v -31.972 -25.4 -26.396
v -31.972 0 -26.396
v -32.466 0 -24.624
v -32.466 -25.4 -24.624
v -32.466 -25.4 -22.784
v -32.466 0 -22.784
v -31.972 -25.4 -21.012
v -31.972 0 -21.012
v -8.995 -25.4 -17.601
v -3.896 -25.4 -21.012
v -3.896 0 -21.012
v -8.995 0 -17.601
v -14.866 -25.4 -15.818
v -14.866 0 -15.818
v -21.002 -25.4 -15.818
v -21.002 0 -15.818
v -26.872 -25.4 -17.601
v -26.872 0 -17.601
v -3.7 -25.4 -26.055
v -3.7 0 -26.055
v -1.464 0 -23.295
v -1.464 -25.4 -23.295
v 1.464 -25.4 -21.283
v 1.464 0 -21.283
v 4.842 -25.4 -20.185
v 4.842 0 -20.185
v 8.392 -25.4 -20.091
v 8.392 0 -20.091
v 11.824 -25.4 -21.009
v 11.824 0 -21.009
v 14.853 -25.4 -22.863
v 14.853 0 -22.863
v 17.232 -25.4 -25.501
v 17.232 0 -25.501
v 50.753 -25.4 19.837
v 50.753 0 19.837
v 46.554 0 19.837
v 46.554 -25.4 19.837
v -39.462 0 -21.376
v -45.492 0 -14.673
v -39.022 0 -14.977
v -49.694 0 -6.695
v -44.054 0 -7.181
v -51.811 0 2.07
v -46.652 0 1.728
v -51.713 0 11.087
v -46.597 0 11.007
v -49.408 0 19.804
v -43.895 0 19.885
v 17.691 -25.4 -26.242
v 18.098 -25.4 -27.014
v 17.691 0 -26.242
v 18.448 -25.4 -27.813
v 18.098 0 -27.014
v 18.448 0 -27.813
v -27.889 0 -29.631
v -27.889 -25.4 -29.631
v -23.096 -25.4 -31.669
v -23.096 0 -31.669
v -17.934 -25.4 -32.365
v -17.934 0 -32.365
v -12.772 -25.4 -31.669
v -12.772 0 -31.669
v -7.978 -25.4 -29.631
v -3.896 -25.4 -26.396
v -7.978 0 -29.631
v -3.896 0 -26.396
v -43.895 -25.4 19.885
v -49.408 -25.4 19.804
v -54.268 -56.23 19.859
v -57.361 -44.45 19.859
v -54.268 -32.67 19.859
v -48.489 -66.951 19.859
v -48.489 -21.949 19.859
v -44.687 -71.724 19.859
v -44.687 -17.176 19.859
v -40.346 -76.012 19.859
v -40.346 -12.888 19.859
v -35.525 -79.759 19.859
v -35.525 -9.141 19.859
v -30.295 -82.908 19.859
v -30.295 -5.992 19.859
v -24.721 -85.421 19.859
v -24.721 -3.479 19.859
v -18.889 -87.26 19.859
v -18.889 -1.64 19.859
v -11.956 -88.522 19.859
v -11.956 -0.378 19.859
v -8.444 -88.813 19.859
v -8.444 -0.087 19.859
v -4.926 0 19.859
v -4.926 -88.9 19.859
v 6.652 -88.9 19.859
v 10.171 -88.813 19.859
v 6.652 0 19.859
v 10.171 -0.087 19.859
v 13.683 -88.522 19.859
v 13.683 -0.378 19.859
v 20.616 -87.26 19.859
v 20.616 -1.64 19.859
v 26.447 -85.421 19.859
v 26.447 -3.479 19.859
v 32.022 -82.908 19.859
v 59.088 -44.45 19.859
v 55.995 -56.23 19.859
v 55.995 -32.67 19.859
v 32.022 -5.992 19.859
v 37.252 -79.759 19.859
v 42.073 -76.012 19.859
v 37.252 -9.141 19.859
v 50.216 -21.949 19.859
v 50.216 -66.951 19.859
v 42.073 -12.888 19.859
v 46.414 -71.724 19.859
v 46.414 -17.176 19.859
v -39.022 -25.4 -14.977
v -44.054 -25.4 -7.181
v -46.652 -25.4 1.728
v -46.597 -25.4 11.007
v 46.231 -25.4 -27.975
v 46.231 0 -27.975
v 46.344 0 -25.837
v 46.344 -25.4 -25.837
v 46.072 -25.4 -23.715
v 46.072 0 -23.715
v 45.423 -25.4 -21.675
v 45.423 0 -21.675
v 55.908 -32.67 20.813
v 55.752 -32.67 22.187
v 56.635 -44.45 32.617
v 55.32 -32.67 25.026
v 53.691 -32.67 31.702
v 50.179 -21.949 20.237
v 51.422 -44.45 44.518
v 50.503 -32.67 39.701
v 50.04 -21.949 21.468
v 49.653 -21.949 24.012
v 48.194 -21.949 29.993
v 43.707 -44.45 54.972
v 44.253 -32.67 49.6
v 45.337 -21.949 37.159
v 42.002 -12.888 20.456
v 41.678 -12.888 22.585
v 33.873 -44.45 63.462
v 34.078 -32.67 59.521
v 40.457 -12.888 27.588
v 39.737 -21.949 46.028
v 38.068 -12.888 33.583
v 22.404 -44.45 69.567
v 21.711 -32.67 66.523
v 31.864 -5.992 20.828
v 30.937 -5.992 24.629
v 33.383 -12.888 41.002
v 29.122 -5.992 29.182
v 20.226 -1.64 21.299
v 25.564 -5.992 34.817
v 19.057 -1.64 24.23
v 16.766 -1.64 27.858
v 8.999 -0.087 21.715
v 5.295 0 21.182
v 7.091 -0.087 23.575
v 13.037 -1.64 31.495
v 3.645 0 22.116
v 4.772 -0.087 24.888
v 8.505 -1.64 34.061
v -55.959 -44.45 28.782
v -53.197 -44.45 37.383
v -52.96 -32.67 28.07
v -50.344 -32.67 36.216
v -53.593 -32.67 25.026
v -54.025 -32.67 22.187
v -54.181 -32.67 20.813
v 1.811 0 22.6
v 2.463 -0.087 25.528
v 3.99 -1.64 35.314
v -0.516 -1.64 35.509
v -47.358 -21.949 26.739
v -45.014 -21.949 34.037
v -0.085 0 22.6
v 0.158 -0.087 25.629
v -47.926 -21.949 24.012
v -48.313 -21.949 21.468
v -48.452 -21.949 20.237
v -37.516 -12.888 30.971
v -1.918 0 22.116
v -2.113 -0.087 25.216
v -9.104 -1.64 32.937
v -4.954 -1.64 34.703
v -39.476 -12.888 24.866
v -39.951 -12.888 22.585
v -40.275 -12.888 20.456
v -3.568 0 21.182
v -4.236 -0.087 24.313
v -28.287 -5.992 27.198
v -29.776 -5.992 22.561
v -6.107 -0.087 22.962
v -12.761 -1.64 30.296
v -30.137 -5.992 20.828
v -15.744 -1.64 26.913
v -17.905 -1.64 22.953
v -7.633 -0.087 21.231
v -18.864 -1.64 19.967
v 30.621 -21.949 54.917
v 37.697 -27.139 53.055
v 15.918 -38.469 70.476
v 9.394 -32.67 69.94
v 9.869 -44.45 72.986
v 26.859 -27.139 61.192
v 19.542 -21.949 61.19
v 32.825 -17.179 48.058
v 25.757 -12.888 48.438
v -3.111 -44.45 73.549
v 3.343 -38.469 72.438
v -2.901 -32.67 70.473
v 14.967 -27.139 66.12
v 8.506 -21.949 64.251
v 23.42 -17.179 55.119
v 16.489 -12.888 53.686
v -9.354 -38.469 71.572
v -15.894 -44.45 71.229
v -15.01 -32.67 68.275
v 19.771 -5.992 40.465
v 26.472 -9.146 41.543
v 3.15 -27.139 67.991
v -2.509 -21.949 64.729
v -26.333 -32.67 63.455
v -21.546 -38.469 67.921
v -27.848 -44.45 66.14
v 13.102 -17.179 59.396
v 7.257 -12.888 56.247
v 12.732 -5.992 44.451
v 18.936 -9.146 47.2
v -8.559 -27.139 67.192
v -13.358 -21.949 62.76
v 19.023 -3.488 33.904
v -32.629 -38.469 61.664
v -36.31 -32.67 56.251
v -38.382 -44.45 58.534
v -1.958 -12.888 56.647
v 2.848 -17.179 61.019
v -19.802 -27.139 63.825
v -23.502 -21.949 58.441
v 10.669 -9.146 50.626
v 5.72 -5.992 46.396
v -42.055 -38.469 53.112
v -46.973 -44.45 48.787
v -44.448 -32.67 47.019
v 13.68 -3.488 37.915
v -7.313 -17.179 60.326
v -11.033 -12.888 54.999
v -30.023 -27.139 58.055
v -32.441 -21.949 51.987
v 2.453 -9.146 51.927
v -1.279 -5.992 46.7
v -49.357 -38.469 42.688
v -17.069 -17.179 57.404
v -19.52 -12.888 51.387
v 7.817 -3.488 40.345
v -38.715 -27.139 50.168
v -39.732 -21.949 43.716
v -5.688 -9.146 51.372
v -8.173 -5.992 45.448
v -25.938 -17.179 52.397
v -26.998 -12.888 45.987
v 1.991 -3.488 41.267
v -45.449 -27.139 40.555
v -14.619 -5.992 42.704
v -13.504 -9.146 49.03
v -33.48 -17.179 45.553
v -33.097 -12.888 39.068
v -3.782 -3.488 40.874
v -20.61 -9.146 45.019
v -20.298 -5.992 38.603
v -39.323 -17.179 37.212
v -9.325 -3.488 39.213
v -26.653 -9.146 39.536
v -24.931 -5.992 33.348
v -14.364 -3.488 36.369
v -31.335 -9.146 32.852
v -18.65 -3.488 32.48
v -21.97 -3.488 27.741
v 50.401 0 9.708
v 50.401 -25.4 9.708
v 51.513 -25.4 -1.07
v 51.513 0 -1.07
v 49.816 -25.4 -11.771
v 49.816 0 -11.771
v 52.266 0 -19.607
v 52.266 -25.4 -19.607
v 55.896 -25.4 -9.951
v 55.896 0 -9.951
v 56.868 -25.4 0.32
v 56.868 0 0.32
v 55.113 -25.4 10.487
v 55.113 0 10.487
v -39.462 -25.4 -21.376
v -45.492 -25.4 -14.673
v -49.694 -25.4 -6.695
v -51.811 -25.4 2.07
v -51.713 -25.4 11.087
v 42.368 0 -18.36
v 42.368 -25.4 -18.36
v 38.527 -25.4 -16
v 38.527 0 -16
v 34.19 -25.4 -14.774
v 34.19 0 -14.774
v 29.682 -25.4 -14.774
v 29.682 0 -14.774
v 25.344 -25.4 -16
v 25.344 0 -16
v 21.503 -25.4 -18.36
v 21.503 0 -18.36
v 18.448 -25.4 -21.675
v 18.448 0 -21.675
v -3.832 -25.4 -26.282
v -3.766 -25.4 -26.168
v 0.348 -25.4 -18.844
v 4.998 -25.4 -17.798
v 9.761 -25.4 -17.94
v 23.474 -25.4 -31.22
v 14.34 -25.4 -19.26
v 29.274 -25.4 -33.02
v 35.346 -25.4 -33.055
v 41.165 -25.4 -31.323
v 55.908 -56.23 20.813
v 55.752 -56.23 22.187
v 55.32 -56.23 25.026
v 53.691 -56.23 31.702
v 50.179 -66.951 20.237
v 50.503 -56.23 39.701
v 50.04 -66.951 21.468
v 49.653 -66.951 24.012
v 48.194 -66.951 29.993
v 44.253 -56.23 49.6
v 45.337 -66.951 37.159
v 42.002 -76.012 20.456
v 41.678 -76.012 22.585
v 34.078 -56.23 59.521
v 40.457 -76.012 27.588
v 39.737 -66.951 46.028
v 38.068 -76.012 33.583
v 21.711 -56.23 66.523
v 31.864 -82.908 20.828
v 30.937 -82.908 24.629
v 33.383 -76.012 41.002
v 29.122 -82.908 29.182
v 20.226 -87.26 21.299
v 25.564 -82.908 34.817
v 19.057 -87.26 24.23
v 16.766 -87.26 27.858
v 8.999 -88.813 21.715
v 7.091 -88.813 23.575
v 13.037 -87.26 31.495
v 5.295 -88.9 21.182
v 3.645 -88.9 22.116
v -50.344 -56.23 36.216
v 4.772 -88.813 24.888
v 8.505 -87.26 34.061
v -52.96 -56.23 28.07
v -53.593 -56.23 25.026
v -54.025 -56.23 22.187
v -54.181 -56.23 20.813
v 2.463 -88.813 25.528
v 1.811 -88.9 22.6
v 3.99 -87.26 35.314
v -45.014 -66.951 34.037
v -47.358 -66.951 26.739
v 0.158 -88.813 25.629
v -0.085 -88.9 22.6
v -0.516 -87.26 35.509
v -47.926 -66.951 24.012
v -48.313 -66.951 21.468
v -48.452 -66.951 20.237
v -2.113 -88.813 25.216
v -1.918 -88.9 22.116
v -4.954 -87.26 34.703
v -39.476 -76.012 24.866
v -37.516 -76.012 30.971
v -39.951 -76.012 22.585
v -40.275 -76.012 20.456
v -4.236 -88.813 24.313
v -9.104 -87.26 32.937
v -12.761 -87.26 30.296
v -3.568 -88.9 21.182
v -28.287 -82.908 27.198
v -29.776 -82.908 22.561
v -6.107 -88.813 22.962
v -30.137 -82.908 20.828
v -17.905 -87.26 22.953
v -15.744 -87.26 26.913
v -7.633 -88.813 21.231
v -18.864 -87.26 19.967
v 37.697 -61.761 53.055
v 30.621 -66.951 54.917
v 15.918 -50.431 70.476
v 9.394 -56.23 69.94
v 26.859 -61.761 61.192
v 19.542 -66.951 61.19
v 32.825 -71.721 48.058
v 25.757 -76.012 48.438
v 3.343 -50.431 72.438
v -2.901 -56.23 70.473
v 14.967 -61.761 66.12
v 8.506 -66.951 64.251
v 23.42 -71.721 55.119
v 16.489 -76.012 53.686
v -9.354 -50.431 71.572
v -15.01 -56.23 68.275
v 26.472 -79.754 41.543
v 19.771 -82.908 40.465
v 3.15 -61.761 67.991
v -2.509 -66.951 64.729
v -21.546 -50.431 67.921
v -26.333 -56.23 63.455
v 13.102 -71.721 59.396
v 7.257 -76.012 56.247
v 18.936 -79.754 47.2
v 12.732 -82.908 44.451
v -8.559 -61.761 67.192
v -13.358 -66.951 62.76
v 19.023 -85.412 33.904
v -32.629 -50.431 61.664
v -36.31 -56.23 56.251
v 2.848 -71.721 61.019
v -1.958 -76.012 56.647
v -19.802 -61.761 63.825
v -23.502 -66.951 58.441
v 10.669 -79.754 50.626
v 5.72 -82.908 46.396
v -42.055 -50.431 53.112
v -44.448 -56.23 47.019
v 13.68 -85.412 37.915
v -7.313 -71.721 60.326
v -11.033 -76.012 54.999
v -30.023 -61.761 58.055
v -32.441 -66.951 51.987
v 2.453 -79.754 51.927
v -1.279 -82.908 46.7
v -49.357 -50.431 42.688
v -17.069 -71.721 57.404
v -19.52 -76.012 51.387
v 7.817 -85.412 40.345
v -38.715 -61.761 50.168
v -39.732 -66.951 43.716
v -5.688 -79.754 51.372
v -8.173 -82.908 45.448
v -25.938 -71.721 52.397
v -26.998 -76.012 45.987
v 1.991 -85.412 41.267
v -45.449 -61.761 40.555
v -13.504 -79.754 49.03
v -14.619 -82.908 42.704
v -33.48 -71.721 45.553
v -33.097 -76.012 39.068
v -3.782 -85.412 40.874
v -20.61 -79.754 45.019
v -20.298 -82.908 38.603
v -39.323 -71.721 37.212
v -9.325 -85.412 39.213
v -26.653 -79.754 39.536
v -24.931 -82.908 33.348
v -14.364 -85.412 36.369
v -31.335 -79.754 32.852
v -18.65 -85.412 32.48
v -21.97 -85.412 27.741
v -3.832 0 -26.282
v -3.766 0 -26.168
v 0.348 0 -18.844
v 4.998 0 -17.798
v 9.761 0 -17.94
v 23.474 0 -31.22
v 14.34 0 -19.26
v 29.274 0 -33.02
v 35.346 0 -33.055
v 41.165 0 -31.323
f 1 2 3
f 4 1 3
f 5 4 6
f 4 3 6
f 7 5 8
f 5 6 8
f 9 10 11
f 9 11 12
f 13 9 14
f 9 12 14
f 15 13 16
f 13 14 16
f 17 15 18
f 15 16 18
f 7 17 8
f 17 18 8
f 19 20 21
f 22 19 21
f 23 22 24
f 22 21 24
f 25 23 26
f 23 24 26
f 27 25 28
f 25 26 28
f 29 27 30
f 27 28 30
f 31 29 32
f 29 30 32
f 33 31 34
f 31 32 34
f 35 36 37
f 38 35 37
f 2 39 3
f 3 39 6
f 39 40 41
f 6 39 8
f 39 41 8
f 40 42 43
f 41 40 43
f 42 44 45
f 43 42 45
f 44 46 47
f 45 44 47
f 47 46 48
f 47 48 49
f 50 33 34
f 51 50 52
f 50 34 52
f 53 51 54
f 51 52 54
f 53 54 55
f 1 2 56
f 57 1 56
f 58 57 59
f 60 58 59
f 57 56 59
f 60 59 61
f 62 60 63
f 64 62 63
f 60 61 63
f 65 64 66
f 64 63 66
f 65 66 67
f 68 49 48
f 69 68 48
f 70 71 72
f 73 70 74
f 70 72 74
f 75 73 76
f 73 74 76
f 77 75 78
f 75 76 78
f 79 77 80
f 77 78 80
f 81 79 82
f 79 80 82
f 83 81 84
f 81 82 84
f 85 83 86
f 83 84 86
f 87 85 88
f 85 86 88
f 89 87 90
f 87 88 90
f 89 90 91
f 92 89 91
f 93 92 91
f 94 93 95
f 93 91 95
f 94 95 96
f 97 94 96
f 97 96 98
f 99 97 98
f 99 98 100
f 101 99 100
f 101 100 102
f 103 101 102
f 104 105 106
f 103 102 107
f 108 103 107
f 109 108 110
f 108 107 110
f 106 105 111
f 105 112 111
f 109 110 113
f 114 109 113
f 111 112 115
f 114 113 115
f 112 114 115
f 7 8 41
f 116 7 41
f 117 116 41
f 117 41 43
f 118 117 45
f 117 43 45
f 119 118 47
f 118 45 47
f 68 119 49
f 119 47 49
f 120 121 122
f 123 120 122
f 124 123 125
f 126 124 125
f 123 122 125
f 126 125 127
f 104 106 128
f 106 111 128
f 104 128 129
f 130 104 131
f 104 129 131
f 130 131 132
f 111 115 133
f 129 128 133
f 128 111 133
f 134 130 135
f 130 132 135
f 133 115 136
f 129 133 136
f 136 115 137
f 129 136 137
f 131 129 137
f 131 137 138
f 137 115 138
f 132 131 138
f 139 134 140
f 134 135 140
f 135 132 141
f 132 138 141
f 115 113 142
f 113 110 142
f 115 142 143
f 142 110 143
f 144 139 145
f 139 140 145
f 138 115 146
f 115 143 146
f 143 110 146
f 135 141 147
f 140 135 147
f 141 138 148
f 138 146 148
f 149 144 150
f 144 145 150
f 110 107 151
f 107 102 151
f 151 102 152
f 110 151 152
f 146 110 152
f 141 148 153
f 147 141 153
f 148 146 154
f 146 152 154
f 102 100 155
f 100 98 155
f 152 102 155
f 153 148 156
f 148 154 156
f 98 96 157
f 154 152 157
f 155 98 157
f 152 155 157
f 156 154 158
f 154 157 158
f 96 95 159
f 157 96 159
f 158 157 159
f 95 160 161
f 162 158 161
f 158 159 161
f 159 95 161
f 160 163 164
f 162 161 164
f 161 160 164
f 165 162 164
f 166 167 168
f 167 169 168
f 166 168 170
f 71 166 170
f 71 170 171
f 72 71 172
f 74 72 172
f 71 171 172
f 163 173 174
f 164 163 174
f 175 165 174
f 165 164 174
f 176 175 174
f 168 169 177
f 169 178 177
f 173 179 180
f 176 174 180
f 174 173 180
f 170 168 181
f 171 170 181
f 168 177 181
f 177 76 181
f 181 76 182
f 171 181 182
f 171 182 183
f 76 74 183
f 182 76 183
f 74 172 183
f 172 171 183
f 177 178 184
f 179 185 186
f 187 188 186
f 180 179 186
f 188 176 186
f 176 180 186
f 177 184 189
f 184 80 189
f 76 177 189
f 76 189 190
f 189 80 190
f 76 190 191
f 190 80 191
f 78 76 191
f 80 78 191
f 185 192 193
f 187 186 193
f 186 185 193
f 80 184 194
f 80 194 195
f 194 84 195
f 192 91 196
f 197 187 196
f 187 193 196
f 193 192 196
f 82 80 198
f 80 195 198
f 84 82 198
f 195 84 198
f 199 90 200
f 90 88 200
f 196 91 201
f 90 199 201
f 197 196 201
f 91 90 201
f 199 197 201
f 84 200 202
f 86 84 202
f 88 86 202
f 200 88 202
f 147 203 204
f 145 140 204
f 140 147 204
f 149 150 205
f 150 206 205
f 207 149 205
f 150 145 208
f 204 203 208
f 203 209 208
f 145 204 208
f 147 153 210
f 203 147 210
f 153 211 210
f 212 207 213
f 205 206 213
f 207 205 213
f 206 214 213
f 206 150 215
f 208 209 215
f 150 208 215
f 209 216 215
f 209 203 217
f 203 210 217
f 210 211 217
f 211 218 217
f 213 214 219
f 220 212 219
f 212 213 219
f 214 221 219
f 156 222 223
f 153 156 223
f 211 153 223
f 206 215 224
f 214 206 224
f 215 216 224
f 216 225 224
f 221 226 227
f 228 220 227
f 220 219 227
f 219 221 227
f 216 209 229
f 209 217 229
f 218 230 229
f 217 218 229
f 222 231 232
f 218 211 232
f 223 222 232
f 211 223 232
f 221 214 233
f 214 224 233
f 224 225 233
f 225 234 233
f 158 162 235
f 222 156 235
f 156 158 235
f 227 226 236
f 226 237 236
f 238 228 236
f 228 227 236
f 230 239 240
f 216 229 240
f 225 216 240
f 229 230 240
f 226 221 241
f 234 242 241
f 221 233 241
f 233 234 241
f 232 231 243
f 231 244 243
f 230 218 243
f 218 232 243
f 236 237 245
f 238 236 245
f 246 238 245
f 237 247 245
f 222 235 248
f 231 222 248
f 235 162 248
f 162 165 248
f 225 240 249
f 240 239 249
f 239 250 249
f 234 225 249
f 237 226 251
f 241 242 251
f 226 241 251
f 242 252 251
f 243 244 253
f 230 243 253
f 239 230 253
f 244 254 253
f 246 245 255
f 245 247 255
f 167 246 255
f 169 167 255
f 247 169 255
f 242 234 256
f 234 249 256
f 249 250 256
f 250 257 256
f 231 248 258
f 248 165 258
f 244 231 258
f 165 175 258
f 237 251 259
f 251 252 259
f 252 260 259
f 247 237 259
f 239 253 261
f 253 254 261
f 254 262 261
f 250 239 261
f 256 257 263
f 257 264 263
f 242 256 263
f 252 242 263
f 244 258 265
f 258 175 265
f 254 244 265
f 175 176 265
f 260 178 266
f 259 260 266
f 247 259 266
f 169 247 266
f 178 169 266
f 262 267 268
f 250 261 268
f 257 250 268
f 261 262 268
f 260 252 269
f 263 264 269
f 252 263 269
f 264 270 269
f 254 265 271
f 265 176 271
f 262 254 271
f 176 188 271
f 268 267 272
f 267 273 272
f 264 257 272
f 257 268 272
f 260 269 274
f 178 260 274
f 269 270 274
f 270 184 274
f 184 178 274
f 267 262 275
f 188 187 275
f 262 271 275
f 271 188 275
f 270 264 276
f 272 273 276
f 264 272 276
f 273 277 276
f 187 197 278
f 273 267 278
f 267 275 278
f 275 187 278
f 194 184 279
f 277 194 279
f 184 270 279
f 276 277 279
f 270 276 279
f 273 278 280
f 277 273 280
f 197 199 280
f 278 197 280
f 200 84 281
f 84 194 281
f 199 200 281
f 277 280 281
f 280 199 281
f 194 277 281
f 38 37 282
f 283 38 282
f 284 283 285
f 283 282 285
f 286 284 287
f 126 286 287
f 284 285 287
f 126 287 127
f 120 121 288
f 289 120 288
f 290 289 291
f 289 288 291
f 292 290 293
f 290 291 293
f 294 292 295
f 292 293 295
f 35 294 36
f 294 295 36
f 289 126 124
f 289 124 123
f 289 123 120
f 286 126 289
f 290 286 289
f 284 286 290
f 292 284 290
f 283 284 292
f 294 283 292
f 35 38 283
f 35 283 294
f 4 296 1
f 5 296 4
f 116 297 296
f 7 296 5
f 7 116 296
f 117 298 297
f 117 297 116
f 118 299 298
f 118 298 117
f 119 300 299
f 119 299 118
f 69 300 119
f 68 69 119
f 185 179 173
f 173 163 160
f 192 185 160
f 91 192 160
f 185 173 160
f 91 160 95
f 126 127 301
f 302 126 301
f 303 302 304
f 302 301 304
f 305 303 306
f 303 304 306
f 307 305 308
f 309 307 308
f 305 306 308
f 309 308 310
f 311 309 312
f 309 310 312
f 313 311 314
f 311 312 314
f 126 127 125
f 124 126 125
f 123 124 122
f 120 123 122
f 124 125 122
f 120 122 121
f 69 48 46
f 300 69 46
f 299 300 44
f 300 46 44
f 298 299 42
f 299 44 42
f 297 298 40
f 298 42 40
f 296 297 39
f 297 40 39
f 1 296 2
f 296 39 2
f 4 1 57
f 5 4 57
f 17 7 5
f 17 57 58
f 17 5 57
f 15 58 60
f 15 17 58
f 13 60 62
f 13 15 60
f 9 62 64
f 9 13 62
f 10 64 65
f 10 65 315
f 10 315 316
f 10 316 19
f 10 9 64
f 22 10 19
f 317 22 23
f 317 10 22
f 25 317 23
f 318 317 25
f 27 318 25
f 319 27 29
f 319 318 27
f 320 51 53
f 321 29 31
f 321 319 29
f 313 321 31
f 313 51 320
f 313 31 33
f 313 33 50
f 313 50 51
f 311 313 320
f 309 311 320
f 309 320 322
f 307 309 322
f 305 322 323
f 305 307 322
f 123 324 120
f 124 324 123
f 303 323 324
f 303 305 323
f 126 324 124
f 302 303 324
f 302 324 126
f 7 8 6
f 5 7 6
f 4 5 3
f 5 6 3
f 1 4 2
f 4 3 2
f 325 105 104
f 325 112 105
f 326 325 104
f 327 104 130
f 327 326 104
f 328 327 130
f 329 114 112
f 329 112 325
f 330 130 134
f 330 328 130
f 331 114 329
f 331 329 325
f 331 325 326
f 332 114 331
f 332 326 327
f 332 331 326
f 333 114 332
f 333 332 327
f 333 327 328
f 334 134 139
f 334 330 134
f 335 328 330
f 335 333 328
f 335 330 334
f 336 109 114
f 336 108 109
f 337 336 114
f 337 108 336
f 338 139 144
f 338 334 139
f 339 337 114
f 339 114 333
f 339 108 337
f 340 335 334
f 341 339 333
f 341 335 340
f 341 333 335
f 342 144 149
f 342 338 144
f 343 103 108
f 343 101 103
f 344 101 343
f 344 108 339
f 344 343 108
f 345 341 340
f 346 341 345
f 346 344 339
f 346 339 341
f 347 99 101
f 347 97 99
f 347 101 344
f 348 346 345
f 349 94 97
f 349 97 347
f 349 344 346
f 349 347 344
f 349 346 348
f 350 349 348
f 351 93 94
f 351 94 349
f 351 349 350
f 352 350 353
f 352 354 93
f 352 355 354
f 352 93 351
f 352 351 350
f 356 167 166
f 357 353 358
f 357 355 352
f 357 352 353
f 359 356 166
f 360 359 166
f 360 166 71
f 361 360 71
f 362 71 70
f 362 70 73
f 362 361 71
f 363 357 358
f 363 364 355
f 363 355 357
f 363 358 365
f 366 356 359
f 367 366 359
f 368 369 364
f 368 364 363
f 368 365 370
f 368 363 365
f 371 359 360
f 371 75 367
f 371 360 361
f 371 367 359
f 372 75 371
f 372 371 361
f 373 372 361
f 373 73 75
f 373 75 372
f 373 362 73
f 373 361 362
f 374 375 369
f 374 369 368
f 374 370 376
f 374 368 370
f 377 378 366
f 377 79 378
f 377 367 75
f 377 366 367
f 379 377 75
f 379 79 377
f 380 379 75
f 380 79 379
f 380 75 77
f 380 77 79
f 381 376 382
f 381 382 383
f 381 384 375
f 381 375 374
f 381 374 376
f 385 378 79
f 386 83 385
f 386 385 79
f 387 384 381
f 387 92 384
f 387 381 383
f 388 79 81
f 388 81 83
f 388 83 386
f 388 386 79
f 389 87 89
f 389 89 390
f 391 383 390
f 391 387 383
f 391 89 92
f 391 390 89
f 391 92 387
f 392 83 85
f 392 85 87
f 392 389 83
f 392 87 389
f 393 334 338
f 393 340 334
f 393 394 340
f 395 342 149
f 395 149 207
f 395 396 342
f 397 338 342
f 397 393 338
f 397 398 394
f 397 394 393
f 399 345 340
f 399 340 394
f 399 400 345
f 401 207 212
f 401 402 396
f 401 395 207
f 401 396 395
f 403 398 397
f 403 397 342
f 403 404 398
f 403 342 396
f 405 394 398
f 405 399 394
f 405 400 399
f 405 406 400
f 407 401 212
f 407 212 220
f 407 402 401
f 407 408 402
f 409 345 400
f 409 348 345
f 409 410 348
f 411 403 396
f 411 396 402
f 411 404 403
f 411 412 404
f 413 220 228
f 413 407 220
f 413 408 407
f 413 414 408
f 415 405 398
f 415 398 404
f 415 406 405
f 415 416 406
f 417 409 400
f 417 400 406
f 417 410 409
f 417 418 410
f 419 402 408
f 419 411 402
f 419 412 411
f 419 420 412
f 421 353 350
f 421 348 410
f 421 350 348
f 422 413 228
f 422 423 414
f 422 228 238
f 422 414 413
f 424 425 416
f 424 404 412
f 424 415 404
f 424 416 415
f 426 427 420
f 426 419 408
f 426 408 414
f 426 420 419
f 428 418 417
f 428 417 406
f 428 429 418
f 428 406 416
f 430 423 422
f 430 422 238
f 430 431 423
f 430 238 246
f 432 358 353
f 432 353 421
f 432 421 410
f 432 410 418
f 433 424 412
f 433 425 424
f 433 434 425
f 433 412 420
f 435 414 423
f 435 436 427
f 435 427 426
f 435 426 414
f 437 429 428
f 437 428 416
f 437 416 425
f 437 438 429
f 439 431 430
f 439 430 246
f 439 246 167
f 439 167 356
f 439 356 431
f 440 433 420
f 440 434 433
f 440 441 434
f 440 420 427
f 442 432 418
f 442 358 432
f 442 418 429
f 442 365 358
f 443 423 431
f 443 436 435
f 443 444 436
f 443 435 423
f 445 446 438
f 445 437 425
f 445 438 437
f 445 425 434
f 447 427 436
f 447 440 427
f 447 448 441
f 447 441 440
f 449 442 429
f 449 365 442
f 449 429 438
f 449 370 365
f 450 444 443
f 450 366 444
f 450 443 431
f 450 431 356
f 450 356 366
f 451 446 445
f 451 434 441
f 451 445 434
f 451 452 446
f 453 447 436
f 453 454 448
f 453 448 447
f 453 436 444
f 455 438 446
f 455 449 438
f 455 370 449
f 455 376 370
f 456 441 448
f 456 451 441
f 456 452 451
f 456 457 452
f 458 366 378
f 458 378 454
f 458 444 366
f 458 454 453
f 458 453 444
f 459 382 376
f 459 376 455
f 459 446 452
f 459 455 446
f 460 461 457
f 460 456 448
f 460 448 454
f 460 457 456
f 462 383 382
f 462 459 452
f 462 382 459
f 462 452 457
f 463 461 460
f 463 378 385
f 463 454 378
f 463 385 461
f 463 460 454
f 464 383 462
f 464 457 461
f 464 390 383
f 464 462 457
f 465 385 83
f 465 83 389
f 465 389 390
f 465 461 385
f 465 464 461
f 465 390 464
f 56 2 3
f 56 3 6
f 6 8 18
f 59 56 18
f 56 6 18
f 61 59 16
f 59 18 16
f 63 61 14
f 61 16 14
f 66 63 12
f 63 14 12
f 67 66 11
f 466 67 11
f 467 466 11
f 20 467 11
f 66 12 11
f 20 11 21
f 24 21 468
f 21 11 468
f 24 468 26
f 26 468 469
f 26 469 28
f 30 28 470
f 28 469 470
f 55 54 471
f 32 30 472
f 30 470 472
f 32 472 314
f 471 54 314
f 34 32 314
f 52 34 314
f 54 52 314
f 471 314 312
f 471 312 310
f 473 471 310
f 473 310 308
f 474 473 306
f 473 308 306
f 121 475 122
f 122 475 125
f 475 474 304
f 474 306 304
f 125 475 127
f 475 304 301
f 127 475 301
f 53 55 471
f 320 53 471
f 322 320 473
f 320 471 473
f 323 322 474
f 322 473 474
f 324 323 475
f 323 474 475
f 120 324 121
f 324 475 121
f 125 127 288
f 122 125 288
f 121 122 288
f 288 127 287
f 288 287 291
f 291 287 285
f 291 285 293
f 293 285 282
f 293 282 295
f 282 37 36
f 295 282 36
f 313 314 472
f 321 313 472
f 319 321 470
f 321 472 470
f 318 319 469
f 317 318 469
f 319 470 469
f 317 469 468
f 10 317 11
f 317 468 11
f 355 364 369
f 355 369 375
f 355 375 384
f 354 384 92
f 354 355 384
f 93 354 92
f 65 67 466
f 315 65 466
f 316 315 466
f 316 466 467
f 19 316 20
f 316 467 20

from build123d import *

# Parameters (mm, degrees)
F1_DEPTH    = 88.9
F2_T2_ANGLE = 359.64
F2_T4_ANGLE = 359.64
F4_DEPTH    = 25.4
F5_DEPTH    = 25.4


# Not quite as in the source:
# - a fillet or chamfer that OpenCascade refuses, or shapes differently, is made with other operations: its cross-section is extruded or revolved along the edge and cut away or added


with BuildPart() as f1:
    # F0 (on Front) → F1 (new body)
    with BuildSketch(Plane.XZ):
        with BuildLine():
            ThreePointArc((59.5757886767, 19.8585987091), (0.8634161204, 74.170312897), (-57.8489564359, 19.8585987091))
            Line((-57.8489564359, 19.8585987091), (59.5757886767, 19.8585987091))
        make_face()
    extrude(amount=F1_DEPTH)

    # F2: fillet of radius 51.5096605668 on 2 edges, made by hand

    # F2_s1 → F2_t2 (revolve, cut)
    with BuildSketch(Plane(origin=(0.9114097399, 0, 0.0028632876), x_dir=(0, 1, 0), z_dir=(-0.9999950652, 0, -0.0031415875))):
        with BuildLine():
            ThreePointArc((-37.3903394332, 43.6137876504), (-73.8131697166, 28.526957367), (-88.9, -7.8958729164))
            Line((-88.9, -7.8958729164), (-88.9, 43.6137876504))
            Line((-88.9, 43.6137876504), (-37.3903394332, 43.6137876504))
        make_face()
    revolve(axis=Axis((0.8634161204, -88.9, 15.2796565729), (0, -1, 0)), revolution_arc=F2_T2_ANGLE, mode=Mode.SUBTRACT)

    # F2_s3 → F2_t4 (revolve, cut)
    with BuildSketch(Plane(origin=(0.9114097399, 0, 0.0028632876), x_dir=(0, 1, 0), z_dir=(-0.9999950652, 0, -0.0031415875))):
        with BuildLine():
            ThreePointArc((-51.5096605668, 43.6137876504), (-15.0868302834, 28.526957367), (0, -7.8958729164))
            Line((0, -7.8958729164), (0, 43.6137876504))
            Line((0, 43.6137876504), (-51.5096605668, 43.6137876504))
        make_face()
    revolve(axis=Axis((0.8634161204, 0, 15.2796565729), (0, -1, 0)), revolution_arc=F2_T4_ANGLE, mode=Mode.SUBTRACT)


with BuildPart() as f4:
    # F3 (on Front) → F4 (new body)
    with BuildSketch(Plane.XZ):
        with BuildLine():
            ThreePointArc((-31.9720953703, -21.0119523108), (-32.5286170117, -23.7042130902), (-31.9720953703, -26.3964738697))
            ThreePointArc((-31.9720953703, -26.3964738697), (-17.9338779999, -32.3648560237), (-3.8956606295, -26.3964738697))
            ThreePointArc((-3.8956606295, -26.3964738697), (-3.7989683826, -26.2248697788), (-3.6995589857, -26.0548252952))
            ThreePointArc((-3.6995589857, -26.0548252952), (-3.1254057527, -23.5072488783), (-3.8956606295, -21.0119523108))
            ThreePointArc((-3.8956606295, -21.0119523108), (-17.9338779999, -15.5918990312), (-31.9720953703, -21.0119523108))
        make_face()
        with BuildLine():
            ThreePointArc((18.44827272, -21.6751024127), (17.3677793216, -23.437783574), (17.2320588287, -25.5008130959))
            ThreePointArc((17.2320588287, -25.5008130959), (17.9013139449, -26.6247801583), (18.44827272, -27.8130732477))
            ThreePointArc((18.44827272, -27.8130732477), (32.308258524, -33.2615091406), (46.2306588888, -27.9745981097))
            ThreePointArc((46.2306588888, -27.9745981097), (46.2561820848, -24.7698070026), (45.4230308533, -21.6751024127))
            ThreePointArc((45.4230308533, -21.6751024127), (31.9356517866, -14.6190424345), (18.44827272, -21.6751024127))
        make_face()
        with BuildLine():
            ThreePointArc((-3.8956606295, -21.0119523108), (-3.1254057527, -23.5072488783), (-3.6995589857, -26.0548252952))
            ThreePointArc((-3.6995589857, -26.0548252952), (6.6135950932, -20.0102340616), (17.2320588287, -25.5008130959))
            ThreePointArc((17.2320588287, -25.5008130959), (17.3677793216, -23.437783574), (18.44827272, -21.6751024127))
            ThreePointArc((18.44827272, -21.6751024127), (7.383863358, -17.7195311955), (-3.8956606295, -21.0119523108))
        make_face()
    extrude(amount=F4_DEPTH)


with BuildPart() as f5:
    # F3 (on Front) → F5 (new body)
    with BuildSketch(Plane.XZ):
        with BuildLine():
            Line((-43.8949614763, 19.8847707361), (-49.4076870382, 19.8037457436))
            ThreePointArc((-49.4076870382, 19.8037457436), (-49.694155963, -6.6945012346), (-31.9720953703, -26.3964738697))
            ThreePointArc((-31.9720953703, -26.3964738697), (-32.5286170117, -23.7042130902), (-31.9720953703, -21.0119523108))
            ThreePointArc((-31.9720953703, -21.0119523108), (-45.6760319405, -2.820809114), (-43.8949614763, 19.8847707361))
        make_face()
    extrude(amount=F5_DEPTH)


with BuildPart() as f5b:
    # F3 (on Front) → F5, piece 2 (new body)
    with BuildSketch(Plane.XZ):
        with BuildLine():
            ThreePointArc((46.5537086129, 19.8369566351), (51.5130220007, -1.0695496802), (45.4230308533, -21.6751024127))
            ThreePointArc((45.4230308533, -21.6751024127), (46.2561820848, -24.7698070026), (46.2306588888, -27.9745981097))
            ThreePointArc((46.2306588888, -27.9745981097), (56.7231845264, -4.8474447832), (50.7533736527, 19.8369566351))
            Line((50.7533736527, 19.8369566351), (46.5537086129, 19.8369566351))
        make_face()
    extrude(amount=F5_DEPTH)


solid = Compound([f1.part, f4.part, f5.part, f5b.part])
